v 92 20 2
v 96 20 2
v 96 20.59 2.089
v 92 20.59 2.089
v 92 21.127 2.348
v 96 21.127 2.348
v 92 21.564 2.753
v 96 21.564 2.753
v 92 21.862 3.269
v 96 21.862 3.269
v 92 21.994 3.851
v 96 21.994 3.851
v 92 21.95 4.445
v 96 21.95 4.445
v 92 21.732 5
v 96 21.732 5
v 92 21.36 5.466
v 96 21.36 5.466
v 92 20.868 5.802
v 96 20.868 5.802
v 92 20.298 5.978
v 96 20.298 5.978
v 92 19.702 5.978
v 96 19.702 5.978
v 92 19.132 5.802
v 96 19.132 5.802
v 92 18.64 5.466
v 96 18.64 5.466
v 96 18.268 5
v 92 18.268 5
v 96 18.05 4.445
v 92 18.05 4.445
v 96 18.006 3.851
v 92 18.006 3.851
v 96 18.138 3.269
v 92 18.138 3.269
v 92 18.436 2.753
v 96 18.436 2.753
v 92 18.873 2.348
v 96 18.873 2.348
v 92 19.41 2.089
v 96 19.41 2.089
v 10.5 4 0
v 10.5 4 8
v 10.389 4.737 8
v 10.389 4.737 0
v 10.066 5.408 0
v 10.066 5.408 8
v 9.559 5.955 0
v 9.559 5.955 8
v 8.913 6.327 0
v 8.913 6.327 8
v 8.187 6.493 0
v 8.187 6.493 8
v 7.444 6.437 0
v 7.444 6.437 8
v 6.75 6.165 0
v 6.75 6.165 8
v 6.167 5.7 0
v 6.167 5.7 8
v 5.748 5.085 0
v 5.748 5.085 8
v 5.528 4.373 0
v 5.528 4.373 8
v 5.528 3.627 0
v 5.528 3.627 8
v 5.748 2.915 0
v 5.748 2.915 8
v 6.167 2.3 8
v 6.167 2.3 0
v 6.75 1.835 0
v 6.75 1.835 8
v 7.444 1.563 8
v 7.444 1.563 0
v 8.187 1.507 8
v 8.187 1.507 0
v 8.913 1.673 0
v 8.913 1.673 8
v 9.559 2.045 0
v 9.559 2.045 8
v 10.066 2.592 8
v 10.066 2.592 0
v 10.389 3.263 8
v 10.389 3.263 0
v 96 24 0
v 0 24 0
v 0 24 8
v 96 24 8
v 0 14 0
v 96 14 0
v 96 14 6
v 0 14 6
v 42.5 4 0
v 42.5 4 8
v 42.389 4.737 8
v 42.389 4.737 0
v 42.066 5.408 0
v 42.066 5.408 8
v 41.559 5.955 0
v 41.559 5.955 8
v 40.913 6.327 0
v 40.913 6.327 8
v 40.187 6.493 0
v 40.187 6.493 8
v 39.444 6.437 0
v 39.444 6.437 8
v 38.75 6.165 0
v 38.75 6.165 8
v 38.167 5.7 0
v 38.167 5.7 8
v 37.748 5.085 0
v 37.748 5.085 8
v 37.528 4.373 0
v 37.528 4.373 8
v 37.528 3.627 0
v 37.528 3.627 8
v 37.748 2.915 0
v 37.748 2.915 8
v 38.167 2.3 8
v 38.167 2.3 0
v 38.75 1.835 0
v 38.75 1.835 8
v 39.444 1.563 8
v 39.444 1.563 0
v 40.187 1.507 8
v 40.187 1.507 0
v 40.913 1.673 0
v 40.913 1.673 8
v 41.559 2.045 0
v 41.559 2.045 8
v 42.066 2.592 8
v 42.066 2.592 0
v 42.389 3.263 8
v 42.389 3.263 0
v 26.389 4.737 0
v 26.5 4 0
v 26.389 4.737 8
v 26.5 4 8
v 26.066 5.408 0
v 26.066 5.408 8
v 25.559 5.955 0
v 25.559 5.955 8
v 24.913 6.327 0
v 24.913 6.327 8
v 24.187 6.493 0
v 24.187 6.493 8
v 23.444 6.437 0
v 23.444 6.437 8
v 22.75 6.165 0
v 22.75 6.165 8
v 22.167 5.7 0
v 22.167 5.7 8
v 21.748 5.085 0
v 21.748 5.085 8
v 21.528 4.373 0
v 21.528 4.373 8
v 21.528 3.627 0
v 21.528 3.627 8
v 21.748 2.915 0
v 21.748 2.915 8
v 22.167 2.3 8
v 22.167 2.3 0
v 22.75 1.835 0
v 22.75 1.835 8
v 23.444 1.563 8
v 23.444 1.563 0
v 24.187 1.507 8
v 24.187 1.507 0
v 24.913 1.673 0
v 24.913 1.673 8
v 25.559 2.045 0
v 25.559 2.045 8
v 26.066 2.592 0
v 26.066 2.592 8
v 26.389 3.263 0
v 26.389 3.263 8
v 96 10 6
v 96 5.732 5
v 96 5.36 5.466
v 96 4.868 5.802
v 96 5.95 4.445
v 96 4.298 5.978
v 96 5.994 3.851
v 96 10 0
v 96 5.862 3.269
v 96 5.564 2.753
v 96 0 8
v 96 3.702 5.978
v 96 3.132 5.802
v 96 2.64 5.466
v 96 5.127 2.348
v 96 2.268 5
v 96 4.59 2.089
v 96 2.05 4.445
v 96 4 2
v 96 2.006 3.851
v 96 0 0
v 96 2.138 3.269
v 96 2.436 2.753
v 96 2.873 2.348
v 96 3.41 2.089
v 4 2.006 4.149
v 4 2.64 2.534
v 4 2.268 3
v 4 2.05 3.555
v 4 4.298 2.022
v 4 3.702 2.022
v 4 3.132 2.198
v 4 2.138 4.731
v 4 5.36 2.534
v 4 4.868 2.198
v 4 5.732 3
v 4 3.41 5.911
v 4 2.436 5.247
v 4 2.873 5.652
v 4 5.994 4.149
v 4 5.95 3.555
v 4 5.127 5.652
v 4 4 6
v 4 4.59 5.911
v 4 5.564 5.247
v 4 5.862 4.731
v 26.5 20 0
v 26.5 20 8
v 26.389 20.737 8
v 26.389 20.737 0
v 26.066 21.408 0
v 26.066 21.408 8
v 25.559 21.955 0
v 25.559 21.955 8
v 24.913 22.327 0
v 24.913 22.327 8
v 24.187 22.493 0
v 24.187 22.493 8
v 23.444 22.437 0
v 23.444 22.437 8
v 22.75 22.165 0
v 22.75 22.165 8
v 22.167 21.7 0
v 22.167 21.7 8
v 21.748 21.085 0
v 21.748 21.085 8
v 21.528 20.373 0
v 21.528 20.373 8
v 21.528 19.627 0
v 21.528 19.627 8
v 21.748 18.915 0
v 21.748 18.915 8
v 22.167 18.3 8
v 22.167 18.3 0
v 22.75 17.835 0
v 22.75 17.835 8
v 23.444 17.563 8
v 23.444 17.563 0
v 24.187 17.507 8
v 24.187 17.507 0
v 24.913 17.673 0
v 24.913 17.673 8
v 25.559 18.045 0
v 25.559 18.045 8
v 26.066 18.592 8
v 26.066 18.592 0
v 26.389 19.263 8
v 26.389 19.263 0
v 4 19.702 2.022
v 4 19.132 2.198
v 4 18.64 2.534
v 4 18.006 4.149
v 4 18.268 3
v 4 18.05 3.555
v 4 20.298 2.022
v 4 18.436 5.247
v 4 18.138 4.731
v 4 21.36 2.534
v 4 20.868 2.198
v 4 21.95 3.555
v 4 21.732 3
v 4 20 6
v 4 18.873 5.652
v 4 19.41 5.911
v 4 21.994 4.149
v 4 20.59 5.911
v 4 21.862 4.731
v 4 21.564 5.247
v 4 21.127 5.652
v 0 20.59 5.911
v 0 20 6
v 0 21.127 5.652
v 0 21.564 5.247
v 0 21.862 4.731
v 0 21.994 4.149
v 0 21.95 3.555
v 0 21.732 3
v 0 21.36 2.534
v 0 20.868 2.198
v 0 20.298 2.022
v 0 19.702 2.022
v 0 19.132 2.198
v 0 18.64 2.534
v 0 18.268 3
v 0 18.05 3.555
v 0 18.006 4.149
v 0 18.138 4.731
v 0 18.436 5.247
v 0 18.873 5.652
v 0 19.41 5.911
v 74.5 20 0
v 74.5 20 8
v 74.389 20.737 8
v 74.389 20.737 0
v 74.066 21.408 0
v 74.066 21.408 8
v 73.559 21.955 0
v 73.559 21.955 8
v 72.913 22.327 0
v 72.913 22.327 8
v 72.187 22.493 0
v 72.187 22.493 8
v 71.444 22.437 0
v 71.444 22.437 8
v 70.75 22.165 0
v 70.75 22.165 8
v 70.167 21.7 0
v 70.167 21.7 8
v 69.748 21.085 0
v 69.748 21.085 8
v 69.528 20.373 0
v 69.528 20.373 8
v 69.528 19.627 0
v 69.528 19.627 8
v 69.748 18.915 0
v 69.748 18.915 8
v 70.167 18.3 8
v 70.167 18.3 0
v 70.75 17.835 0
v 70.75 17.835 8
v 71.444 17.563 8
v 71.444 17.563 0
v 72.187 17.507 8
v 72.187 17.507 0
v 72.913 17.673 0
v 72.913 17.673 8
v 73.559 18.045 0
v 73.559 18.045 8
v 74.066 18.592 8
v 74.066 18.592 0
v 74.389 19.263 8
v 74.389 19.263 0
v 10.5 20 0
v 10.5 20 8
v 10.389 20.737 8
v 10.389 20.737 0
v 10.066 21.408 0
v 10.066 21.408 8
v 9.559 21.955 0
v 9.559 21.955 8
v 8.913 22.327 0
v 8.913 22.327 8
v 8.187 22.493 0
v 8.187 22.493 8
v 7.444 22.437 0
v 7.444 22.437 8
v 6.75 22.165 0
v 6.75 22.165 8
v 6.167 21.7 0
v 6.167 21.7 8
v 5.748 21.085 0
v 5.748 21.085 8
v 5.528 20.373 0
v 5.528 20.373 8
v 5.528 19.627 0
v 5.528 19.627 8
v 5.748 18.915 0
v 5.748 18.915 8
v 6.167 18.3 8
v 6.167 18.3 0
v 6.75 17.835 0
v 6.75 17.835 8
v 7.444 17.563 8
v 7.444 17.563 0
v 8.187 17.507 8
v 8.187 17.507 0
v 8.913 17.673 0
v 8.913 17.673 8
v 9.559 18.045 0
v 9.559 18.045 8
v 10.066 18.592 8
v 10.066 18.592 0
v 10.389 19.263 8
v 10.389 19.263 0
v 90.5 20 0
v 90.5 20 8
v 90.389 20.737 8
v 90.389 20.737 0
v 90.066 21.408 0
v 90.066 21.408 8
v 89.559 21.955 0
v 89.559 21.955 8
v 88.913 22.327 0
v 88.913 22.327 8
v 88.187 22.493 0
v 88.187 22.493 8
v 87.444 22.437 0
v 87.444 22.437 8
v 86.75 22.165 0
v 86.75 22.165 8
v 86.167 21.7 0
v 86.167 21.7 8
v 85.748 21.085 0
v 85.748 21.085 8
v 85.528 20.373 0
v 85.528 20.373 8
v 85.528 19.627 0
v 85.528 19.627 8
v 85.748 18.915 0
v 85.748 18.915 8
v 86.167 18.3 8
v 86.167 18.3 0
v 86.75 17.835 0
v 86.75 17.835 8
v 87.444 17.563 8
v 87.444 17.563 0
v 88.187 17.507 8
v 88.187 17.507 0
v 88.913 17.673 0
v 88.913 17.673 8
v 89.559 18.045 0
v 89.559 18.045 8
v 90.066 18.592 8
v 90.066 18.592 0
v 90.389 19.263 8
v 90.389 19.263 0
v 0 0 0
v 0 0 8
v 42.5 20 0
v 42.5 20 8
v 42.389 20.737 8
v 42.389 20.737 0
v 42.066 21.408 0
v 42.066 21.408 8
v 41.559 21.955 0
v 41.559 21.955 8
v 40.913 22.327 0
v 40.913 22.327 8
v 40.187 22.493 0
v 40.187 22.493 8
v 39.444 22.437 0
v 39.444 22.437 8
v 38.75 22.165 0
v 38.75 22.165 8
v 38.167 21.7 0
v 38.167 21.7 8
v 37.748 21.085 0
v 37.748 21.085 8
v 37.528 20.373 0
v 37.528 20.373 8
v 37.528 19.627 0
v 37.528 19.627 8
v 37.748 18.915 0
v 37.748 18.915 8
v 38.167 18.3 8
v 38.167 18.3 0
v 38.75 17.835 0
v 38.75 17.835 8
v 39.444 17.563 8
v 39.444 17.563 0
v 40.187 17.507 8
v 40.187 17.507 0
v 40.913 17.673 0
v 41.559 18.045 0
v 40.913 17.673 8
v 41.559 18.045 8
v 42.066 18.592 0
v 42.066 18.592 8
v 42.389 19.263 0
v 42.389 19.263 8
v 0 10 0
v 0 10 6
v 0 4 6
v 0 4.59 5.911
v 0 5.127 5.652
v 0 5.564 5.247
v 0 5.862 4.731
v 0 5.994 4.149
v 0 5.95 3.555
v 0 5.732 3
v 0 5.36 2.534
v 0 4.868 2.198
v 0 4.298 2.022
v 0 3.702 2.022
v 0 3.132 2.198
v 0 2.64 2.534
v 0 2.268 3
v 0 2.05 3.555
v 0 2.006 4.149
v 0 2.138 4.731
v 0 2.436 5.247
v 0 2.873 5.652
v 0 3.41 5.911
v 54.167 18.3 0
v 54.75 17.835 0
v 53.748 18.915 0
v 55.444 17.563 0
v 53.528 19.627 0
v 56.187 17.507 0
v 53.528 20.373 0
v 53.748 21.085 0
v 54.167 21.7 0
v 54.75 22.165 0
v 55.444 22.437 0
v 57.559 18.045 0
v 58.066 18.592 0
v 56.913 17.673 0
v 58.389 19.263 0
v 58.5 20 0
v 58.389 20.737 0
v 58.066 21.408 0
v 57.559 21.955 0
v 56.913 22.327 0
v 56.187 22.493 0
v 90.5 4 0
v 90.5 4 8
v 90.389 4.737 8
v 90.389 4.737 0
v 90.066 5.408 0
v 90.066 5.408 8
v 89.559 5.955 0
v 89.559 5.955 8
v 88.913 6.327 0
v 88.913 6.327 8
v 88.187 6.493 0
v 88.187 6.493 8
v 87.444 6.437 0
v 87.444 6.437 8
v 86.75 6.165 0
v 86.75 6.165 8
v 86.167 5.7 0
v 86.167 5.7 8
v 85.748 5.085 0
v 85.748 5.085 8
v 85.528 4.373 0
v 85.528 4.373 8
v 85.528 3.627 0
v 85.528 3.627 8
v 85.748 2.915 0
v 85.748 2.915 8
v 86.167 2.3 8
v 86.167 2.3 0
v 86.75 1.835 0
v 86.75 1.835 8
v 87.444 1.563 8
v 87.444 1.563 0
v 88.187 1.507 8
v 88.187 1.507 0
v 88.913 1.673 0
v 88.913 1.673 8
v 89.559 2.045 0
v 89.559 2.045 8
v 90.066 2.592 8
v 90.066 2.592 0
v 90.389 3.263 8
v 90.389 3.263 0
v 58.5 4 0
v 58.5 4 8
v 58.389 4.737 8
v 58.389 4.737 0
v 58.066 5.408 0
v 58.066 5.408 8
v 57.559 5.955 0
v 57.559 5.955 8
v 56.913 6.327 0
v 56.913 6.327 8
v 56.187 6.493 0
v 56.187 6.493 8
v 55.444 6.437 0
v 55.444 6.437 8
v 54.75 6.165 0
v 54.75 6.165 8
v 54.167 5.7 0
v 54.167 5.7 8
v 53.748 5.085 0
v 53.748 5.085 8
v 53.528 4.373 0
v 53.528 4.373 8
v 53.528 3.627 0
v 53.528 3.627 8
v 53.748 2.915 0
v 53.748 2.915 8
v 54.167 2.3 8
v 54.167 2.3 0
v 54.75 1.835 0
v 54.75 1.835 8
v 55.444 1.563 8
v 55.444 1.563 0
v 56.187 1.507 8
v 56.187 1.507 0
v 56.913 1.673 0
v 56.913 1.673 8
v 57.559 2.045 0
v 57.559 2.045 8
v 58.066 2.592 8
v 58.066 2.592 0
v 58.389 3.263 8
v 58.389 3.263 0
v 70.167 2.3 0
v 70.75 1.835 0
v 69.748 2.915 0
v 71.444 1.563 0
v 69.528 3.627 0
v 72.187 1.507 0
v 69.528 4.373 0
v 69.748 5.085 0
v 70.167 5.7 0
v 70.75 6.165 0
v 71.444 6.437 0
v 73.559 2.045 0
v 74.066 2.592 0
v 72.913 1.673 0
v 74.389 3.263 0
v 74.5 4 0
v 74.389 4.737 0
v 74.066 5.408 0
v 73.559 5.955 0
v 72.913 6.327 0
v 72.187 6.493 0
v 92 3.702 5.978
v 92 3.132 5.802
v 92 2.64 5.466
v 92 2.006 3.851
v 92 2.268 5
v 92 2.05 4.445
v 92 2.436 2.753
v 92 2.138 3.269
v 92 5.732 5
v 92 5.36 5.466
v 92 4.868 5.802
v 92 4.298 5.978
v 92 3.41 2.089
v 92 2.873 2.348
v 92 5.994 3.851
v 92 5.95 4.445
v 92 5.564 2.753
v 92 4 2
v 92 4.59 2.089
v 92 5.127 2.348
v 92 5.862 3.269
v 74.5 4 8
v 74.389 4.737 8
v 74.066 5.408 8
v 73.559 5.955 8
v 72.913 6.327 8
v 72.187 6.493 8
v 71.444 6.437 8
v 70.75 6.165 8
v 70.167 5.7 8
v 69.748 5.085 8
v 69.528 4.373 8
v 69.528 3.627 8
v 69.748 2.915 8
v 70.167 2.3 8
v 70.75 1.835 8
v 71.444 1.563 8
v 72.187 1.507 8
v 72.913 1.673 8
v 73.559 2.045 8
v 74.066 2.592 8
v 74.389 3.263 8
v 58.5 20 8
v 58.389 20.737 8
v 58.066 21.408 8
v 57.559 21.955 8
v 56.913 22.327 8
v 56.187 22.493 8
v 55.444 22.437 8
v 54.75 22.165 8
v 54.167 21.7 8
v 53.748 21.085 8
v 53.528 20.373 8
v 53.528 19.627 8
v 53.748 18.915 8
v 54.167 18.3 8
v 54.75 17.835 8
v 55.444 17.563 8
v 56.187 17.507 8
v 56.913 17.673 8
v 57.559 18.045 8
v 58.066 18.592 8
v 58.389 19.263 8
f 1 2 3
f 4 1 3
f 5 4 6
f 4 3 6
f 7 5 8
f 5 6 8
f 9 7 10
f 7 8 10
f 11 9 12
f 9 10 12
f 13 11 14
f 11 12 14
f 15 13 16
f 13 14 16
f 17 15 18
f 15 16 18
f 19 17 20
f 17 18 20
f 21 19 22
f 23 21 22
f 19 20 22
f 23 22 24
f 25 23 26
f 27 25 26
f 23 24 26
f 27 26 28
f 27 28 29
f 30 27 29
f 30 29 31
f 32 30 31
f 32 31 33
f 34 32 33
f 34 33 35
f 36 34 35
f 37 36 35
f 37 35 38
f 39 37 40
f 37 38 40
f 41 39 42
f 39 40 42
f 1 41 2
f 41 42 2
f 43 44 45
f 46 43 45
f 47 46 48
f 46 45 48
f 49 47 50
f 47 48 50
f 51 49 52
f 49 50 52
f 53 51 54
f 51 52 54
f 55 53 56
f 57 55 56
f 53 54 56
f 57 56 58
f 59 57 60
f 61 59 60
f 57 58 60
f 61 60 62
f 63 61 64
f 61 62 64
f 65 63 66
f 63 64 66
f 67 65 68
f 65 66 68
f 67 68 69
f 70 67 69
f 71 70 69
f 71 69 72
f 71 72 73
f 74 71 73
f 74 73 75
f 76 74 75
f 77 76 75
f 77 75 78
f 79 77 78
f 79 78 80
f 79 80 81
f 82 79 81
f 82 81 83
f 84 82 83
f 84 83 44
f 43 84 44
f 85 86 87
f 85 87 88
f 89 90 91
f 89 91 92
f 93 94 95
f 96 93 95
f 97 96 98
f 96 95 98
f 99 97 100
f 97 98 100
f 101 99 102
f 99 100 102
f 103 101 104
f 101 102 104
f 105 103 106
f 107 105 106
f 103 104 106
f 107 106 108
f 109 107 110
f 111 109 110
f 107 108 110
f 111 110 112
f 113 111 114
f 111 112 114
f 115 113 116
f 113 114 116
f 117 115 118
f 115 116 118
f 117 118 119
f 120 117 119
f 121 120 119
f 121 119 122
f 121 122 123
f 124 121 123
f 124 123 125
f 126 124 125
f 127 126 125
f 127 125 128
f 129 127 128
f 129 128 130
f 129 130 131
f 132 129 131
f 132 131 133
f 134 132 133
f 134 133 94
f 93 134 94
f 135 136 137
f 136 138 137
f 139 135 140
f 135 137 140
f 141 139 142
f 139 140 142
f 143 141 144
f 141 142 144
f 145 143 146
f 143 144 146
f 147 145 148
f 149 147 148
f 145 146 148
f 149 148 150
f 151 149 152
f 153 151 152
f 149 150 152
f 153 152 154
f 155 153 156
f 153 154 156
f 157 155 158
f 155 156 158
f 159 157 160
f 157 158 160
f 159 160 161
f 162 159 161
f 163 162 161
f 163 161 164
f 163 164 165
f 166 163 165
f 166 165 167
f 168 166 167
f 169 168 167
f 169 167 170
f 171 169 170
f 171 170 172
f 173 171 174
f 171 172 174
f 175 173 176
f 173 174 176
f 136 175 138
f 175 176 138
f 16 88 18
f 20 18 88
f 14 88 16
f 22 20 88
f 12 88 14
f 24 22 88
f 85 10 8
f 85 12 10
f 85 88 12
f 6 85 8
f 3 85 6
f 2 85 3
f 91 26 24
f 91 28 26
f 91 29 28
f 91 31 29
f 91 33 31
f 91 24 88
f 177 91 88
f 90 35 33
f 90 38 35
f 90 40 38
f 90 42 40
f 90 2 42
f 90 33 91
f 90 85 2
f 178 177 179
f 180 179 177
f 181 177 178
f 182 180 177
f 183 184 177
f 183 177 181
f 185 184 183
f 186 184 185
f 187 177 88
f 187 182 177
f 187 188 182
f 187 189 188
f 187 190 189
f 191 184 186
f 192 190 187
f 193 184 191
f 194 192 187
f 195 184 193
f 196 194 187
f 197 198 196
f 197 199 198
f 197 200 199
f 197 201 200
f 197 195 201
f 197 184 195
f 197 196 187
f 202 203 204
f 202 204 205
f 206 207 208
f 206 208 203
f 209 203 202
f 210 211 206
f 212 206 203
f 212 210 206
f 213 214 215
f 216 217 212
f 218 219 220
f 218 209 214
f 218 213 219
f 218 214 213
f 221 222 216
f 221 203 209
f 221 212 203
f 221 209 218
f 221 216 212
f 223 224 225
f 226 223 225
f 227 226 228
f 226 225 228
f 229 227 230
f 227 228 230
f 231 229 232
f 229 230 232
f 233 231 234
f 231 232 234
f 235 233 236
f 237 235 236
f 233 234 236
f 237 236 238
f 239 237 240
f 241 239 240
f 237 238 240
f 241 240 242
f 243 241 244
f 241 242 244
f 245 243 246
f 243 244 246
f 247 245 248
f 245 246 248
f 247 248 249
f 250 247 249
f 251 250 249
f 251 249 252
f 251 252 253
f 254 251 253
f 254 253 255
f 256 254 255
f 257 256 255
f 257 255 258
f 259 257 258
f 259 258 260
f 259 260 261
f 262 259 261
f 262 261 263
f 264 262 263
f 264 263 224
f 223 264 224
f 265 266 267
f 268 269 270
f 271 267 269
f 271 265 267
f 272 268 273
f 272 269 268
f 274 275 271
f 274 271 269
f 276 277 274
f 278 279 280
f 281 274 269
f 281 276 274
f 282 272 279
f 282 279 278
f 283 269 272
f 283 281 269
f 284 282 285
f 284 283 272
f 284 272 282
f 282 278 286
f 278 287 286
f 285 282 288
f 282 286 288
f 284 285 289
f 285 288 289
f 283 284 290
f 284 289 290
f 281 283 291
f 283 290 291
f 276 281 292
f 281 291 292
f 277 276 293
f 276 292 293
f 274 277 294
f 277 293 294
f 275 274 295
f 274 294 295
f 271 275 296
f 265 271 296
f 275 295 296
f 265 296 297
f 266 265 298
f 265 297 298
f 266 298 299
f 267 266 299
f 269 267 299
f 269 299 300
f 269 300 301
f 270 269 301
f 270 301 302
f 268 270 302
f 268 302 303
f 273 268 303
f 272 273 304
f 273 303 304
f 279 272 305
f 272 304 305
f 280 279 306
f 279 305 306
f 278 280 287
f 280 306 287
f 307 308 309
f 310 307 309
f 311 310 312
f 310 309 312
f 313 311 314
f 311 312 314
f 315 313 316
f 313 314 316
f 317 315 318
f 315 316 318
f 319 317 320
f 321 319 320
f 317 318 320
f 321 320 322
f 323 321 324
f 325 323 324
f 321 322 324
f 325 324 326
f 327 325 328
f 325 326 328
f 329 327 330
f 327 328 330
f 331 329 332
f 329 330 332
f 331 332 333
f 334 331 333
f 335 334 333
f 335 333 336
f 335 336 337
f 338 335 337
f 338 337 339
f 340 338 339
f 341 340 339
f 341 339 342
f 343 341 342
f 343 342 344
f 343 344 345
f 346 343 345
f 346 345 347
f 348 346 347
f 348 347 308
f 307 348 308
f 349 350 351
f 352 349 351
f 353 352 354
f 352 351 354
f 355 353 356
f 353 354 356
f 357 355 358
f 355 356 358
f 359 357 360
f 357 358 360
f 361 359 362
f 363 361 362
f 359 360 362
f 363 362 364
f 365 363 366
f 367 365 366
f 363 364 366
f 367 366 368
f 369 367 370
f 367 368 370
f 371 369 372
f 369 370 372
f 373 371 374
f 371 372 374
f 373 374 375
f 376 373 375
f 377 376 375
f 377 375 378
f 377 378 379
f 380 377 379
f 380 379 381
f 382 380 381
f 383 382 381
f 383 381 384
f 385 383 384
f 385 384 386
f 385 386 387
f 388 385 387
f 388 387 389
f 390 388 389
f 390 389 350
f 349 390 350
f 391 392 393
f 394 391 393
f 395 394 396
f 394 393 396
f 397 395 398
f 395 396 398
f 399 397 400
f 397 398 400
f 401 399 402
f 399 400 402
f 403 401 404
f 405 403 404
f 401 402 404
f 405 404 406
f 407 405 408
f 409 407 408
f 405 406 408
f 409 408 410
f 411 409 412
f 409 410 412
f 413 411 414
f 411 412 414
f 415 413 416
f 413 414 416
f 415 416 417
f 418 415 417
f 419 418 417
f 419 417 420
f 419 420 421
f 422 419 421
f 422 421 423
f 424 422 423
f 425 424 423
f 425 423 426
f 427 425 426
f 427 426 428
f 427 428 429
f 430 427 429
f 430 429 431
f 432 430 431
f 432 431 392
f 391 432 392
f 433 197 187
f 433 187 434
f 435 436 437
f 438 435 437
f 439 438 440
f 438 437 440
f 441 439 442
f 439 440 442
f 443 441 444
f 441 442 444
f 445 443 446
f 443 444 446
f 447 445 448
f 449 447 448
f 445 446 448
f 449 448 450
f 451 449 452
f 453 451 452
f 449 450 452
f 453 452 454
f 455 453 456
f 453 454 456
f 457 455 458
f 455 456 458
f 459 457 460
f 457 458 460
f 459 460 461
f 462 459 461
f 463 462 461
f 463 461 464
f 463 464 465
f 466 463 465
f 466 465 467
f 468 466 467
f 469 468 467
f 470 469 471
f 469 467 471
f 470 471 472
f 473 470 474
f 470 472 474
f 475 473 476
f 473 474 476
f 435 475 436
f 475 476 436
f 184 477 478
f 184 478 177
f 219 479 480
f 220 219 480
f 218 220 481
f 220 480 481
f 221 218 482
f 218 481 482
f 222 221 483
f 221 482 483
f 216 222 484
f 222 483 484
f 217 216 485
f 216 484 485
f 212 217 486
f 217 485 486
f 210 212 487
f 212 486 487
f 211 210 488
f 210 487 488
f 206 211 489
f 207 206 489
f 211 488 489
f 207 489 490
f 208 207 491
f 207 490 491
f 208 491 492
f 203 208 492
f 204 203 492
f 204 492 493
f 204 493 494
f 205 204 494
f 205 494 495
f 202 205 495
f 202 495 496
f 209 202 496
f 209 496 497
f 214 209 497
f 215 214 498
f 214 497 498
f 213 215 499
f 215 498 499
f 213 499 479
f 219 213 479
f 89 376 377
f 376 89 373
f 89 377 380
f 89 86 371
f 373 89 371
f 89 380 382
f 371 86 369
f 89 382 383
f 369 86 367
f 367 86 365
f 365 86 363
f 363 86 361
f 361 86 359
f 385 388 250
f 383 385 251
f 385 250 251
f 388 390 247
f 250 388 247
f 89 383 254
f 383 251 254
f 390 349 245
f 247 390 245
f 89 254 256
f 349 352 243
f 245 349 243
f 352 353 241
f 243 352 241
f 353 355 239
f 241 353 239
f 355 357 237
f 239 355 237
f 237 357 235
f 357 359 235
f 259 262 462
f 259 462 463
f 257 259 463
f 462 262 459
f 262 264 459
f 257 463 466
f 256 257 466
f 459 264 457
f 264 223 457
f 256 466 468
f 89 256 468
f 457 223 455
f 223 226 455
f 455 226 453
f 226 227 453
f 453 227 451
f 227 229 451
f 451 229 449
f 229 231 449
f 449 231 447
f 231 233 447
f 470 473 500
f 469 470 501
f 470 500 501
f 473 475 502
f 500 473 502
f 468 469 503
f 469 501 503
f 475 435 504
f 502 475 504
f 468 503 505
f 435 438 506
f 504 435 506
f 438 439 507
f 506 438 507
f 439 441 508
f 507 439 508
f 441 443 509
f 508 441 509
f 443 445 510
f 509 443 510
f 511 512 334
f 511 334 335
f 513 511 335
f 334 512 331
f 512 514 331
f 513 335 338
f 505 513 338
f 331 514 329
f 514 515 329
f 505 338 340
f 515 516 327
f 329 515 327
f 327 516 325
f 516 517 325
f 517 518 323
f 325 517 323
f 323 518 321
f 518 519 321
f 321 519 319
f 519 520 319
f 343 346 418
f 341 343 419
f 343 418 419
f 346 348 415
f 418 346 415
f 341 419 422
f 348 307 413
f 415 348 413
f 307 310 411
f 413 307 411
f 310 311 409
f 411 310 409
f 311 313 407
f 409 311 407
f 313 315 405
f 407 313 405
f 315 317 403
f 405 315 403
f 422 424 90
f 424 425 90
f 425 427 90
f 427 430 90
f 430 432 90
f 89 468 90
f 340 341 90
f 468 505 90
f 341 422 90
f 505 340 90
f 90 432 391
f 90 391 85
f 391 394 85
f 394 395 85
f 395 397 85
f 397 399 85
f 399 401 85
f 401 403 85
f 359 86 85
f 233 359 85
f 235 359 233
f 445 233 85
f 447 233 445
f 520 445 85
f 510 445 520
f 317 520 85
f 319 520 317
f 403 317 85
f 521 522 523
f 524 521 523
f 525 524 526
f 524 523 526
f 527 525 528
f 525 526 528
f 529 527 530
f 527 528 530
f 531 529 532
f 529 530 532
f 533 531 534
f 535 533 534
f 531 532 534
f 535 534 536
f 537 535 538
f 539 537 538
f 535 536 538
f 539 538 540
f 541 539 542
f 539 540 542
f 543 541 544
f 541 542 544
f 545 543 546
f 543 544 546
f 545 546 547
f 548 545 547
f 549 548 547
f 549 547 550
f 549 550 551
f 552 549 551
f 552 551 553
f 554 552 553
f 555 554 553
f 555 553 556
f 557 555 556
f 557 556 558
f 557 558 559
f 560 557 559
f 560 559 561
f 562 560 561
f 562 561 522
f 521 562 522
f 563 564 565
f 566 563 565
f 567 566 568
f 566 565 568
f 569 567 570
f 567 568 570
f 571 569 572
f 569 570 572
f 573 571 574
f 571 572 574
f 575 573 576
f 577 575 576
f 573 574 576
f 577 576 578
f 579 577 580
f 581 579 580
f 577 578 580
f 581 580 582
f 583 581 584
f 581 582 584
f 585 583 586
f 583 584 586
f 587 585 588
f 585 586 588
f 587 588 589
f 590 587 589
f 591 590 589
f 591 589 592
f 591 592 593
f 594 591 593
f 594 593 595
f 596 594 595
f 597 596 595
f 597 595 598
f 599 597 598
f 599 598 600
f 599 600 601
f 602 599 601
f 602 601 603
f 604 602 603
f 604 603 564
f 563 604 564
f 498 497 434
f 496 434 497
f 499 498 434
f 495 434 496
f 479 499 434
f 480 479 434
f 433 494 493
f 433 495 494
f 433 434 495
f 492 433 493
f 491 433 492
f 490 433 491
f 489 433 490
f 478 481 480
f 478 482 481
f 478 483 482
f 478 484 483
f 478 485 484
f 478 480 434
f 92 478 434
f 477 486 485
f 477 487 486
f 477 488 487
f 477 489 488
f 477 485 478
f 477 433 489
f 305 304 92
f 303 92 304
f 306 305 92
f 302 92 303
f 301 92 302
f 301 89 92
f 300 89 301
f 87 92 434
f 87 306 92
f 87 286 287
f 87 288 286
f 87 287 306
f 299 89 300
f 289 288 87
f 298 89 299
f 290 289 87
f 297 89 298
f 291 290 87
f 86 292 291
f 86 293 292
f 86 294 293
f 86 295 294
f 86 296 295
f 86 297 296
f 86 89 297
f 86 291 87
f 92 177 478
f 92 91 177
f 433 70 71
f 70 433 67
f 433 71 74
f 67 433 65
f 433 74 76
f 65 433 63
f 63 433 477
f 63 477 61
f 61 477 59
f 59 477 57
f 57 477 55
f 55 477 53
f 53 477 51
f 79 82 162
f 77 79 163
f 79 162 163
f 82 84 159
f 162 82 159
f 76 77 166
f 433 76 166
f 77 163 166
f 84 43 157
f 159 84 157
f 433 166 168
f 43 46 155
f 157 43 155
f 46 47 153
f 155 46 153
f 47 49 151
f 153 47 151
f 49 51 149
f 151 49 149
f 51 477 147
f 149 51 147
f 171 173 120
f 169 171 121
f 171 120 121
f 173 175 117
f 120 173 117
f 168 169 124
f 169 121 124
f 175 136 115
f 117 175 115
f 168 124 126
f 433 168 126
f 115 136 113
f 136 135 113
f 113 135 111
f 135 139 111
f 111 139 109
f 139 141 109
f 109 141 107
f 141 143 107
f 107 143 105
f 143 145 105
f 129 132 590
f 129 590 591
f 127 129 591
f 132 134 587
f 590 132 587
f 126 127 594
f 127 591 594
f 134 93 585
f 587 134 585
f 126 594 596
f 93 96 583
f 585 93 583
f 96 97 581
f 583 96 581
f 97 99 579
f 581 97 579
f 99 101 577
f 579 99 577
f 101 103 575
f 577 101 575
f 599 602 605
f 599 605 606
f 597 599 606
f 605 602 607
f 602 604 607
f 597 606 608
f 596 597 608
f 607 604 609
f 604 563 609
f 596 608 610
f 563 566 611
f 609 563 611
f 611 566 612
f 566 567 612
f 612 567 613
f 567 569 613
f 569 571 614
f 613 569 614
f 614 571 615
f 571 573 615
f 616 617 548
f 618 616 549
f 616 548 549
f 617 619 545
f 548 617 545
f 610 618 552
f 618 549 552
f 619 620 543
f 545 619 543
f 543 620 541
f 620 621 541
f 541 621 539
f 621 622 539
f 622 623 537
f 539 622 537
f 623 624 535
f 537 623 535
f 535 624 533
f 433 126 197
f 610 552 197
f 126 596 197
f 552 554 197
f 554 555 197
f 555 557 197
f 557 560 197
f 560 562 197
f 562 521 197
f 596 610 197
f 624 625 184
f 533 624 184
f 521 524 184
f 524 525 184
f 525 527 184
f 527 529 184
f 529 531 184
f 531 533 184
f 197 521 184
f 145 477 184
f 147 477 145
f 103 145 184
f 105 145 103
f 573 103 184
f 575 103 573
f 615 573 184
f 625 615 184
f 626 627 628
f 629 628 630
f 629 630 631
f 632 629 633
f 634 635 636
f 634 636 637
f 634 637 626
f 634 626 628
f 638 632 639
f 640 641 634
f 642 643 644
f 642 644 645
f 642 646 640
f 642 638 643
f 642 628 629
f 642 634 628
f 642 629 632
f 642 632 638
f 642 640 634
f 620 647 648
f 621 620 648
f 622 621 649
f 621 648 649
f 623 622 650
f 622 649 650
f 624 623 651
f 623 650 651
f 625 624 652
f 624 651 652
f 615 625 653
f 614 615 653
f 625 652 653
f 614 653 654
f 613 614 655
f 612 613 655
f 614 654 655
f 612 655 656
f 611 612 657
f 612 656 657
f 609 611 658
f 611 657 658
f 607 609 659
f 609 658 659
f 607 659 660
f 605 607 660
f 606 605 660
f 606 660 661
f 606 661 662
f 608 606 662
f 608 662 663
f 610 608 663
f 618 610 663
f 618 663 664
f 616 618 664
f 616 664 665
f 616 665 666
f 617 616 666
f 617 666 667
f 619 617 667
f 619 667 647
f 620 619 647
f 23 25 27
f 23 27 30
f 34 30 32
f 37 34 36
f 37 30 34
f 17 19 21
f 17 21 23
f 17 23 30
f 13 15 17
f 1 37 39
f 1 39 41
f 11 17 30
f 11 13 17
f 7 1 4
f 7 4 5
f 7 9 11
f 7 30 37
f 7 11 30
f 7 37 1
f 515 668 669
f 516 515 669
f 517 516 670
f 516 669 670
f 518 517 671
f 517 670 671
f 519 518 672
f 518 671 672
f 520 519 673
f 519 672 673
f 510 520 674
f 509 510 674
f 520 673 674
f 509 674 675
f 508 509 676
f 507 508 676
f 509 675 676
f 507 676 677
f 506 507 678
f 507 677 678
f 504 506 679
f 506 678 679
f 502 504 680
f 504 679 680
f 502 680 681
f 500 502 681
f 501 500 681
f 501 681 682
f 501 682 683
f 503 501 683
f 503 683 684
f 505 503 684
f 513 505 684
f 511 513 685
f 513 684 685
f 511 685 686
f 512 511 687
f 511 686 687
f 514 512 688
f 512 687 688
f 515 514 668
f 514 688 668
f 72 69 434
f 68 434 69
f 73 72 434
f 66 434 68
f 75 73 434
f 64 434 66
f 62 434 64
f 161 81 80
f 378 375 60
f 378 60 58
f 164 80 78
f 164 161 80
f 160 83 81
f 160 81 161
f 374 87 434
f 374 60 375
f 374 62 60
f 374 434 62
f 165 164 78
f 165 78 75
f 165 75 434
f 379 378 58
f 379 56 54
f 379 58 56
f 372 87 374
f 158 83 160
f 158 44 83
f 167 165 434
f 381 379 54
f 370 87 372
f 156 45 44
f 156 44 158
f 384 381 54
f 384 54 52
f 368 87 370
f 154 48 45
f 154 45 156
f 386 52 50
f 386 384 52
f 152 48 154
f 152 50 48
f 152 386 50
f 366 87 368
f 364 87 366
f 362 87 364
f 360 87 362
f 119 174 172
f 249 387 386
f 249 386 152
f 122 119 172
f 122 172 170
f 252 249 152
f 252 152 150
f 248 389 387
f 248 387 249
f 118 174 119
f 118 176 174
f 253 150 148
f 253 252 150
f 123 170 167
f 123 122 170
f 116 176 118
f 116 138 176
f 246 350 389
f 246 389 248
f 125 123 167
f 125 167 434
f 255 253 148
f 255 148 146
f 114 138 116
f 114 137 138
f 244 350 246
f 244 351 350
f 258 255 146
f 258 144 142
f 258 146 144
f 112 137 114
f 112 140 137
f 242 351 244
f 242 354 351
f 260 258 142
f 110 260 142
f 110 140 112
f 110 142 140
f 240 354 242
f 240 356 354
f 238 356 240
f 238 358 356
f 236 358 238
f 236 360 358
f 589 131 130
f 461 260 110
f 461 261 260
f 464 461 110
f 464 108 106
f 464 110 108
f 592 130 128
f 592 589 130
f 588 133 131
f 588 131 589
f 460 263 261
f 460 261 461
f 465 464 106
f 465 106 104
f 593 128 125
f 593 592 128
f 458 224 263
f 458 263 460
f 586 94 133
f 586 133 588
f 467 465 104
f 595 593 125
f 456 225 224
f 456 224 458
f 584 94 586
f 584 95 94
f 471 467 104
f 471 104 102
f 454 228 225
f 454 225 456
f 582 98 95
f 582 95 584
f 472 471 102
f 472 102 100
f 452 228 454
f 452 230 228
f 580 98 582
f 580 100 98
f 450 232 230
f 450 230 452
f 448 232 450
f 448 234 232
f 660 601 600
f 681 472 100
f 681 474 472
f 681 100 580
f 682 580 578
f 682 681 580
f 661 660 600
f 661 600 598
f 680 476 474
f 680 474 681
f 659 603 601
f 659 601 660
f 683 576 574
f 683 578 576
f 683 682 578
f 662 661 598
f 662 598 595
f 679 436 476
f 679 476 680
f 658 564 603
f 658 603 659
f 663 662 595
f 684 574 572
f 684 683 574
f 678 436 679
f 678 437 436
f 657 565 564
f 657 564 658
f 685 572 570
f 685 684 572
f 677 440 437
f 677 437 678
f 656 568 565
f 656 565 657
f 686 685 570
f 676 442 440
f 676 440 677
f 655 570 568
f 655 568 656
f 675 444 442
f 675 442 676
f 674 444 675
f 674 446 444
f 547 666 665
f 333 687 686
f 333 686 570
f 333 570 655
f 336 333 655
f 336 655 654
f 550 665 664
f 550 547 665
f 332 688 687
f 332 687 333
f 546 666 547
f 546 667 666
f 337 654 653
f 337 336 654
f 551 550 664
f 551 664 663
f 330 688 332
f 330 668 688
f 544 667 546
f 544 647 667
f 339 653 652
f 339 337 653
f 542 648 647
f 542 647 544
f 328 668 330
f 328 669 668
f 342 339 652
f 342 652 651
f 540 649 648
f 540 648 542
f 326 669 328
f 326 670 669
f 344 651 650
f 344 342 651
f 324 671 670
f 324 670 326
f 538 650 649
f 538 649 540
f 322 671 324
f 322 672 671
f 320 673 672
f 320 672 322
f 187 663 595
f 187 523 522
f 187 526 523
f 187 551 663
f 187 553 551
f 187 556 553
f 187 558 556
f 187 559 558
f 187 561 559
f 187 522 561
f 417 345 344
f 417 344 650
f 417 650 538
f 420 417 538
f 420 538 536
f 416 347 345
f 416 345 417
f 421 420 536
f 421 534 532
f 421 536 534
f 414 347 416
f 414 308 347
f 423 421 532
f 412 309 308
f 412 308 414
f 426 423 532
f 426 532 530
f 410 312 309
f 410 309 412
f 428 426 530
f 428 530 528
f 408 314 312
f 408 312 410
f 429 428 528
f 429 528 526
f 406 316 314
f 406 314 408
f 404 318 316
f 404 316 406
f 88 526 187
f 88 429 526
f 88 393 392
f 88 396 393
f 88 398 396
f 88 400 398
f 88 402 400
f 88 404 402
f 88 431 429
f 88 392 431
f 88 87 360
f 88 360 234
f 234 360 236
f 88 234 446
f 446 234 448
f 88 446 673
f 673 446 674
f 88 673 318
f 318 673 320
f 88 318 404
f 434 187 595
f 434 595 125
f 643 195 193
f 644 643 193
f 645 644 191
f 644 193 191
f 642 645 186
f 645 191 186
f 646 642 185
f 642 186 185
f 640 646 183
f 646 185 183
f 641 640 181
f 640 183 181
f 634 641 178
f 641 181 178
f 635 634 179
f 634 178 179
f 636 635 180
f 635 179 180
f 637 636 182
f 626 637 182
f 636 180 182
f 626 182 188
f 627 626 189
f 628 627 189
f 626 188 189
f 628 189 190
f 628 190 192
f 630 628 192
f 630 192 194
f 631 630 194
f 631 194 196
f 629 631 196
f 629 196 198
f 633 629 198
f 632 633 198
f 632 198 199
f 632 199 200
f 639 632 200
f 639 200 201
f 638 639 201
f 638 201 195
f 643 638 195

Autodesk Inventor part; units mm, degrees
ref_plane "YZ Plane" through (0, 0, 0) normal (1, 0, 0) x (0, 1, 0)
ref_plane "XZ Plane" through (0, 0, 0) normal (0, 1, 0) x (-1, 0, 0)
ref_plane "XY Plane" through (0, 0, 0) normal (0, 0, 1) x (1, 0, 0)
sketch "Sketch1" plane through (0, 0, 0) normal (0, 0, 1) x (1, 0, 0)
  line L0 (96, 0) -> (0, 0)
  line L1 (0, 0) -> (0, 24)
  line L2 (0, 24) -> (96, 24)
  line L3 (96, 24) -> (96, 0)
  point P0 (0, 0)
  dimension "d0" = 96
  dimension "d1" = 24
extrude "Extrusion1" add sketch "Sketch1" along normal blind 8
sketch "Sketch5" plane through (0, 0, 8) normal (0, 0, 1) x (1, 0, 0)
  circle A0 centre (88, 20) radius 2.5
  line L0 (144, 20) -> (0, 20) construction
  line L1 (88, 24) -> (88, 0) construction
  line L2 (96, 24) -> (0, 24) construction
  line L3 (0, 0) -> (96, 0) construction
  line L4 (0, 24) -> (96, 24) construction
  line L5 (96, 24) -> (96, 0) construction
  line L6 (96, 0) -> (0, 0) construction
  line L7 (0, 0) -> (0, 24) construction
  circle A1 centre (72, 20) radius 2.5
  circle A2 centre (56, 20) radius 2.5
  circle A3 centre (40, 20) radius 2.5
  circle A4 centre (24, 20) radius 2.5
  circle A5 centre (8, 20) radius 2.5
  circle A6 centre (88, 4) radius 2.5
  circle A7 centre (72, 4) radius 2.5
  circle A8 centre (56, 4) radius 2.5
  circle A9 centre (40, 4) radius 2.5
  circle A10 centre (24, 4) radius 2.5
  circle A11 centre (8, 4) radius 2.5
  dimension "d30" = 5
  dimension "d83" = 4
  dimension "d84" = 8
  dimension "d87" = 16
  dimension "d90" = 16
extrude "Extrusion8" cut sketch "Sketch5" against normal through all
sketch "Sketch9" plane through (96, 0, 0) normal (1, 0, 0) x (0, 0, -1)
  circle A0 centre (-4, 20) radius 2
  circle A1 centre (-4, 4) radius 2
  line L0 (0, 0) -> (-8, 0) projected
  line L1 (0, 24) -> (-8, 24) construction
  line L2 (-8, 24) -> (0, 24) construction
  line L3 (0, 24) -> (0, 0) construction
  line L4 (0, 0) -> (-8, 0) construction
  line L5 (-8, 0) -> (-8, 24) construction
  point P0 (0, 0)
  dimension "d95" = 4
  dimension "d96" = 4
  dimension "d97" = 4
  dimension "d98" = 4
  dimension "d99" = 4
  dimension "d100" = 4
extrude "Extrusion9" cut sketch "Sketch9" against normal blind 4
sketch "Sketch10" plane through (0, 0, 0) normal (-1, 0, 0) x (0, 0, 1)
  line L0 (0, 24) -> (0, 0) construction
  line L1 (0, 24) -> (8, 24) construction
  line L2 (8, 24) -> (8, 0) construction
  line L3 (8, 0) -> (0, 0) construction
  line L4 (0, 0) -> (0, 24) construction
  circle A0 centre (4, 20) radius 2
  circle A1 centre (4, 4) radius 2
  point P0 (0, 0)
  dimension "d107" = 4
  dimension "d108" = 4
  dimension "d109" = 4
  dimension "d110" = 4
  dimension "d111" = 4
  dimension "d112" = 4
extrude "Extrusion10" cut sketch "Sketch10" against normal blind 4
sketch "Sketch11" plane through (0, 0, 0) normal (0, 0, -1) x (-1, 0, 0)
  line L0 (-96, 24) -> (-96, 0) projected
  line L1 (-96, 14) -> (48, 14)
  line L2 (48, 14) -> (48, 10)
  line L3 (48, 10) -> (-96, 10)
  line L4 (-96, 10) -> (-96, 14)
  line L5 (0, 24) -> (-96, 24) projected
  line L6 (-96, 0) -> (0, 0) projected
  point P0 (0, 0)
  dimension "d119" = 10
  dimension "d120" = 10
  dimension "d121" = 144
extrude "Extrusion11" cut sketch "Sketch11" against normal blind 6
properties part number "Beam0824-096-Blue" material "Aluminum 6061"
